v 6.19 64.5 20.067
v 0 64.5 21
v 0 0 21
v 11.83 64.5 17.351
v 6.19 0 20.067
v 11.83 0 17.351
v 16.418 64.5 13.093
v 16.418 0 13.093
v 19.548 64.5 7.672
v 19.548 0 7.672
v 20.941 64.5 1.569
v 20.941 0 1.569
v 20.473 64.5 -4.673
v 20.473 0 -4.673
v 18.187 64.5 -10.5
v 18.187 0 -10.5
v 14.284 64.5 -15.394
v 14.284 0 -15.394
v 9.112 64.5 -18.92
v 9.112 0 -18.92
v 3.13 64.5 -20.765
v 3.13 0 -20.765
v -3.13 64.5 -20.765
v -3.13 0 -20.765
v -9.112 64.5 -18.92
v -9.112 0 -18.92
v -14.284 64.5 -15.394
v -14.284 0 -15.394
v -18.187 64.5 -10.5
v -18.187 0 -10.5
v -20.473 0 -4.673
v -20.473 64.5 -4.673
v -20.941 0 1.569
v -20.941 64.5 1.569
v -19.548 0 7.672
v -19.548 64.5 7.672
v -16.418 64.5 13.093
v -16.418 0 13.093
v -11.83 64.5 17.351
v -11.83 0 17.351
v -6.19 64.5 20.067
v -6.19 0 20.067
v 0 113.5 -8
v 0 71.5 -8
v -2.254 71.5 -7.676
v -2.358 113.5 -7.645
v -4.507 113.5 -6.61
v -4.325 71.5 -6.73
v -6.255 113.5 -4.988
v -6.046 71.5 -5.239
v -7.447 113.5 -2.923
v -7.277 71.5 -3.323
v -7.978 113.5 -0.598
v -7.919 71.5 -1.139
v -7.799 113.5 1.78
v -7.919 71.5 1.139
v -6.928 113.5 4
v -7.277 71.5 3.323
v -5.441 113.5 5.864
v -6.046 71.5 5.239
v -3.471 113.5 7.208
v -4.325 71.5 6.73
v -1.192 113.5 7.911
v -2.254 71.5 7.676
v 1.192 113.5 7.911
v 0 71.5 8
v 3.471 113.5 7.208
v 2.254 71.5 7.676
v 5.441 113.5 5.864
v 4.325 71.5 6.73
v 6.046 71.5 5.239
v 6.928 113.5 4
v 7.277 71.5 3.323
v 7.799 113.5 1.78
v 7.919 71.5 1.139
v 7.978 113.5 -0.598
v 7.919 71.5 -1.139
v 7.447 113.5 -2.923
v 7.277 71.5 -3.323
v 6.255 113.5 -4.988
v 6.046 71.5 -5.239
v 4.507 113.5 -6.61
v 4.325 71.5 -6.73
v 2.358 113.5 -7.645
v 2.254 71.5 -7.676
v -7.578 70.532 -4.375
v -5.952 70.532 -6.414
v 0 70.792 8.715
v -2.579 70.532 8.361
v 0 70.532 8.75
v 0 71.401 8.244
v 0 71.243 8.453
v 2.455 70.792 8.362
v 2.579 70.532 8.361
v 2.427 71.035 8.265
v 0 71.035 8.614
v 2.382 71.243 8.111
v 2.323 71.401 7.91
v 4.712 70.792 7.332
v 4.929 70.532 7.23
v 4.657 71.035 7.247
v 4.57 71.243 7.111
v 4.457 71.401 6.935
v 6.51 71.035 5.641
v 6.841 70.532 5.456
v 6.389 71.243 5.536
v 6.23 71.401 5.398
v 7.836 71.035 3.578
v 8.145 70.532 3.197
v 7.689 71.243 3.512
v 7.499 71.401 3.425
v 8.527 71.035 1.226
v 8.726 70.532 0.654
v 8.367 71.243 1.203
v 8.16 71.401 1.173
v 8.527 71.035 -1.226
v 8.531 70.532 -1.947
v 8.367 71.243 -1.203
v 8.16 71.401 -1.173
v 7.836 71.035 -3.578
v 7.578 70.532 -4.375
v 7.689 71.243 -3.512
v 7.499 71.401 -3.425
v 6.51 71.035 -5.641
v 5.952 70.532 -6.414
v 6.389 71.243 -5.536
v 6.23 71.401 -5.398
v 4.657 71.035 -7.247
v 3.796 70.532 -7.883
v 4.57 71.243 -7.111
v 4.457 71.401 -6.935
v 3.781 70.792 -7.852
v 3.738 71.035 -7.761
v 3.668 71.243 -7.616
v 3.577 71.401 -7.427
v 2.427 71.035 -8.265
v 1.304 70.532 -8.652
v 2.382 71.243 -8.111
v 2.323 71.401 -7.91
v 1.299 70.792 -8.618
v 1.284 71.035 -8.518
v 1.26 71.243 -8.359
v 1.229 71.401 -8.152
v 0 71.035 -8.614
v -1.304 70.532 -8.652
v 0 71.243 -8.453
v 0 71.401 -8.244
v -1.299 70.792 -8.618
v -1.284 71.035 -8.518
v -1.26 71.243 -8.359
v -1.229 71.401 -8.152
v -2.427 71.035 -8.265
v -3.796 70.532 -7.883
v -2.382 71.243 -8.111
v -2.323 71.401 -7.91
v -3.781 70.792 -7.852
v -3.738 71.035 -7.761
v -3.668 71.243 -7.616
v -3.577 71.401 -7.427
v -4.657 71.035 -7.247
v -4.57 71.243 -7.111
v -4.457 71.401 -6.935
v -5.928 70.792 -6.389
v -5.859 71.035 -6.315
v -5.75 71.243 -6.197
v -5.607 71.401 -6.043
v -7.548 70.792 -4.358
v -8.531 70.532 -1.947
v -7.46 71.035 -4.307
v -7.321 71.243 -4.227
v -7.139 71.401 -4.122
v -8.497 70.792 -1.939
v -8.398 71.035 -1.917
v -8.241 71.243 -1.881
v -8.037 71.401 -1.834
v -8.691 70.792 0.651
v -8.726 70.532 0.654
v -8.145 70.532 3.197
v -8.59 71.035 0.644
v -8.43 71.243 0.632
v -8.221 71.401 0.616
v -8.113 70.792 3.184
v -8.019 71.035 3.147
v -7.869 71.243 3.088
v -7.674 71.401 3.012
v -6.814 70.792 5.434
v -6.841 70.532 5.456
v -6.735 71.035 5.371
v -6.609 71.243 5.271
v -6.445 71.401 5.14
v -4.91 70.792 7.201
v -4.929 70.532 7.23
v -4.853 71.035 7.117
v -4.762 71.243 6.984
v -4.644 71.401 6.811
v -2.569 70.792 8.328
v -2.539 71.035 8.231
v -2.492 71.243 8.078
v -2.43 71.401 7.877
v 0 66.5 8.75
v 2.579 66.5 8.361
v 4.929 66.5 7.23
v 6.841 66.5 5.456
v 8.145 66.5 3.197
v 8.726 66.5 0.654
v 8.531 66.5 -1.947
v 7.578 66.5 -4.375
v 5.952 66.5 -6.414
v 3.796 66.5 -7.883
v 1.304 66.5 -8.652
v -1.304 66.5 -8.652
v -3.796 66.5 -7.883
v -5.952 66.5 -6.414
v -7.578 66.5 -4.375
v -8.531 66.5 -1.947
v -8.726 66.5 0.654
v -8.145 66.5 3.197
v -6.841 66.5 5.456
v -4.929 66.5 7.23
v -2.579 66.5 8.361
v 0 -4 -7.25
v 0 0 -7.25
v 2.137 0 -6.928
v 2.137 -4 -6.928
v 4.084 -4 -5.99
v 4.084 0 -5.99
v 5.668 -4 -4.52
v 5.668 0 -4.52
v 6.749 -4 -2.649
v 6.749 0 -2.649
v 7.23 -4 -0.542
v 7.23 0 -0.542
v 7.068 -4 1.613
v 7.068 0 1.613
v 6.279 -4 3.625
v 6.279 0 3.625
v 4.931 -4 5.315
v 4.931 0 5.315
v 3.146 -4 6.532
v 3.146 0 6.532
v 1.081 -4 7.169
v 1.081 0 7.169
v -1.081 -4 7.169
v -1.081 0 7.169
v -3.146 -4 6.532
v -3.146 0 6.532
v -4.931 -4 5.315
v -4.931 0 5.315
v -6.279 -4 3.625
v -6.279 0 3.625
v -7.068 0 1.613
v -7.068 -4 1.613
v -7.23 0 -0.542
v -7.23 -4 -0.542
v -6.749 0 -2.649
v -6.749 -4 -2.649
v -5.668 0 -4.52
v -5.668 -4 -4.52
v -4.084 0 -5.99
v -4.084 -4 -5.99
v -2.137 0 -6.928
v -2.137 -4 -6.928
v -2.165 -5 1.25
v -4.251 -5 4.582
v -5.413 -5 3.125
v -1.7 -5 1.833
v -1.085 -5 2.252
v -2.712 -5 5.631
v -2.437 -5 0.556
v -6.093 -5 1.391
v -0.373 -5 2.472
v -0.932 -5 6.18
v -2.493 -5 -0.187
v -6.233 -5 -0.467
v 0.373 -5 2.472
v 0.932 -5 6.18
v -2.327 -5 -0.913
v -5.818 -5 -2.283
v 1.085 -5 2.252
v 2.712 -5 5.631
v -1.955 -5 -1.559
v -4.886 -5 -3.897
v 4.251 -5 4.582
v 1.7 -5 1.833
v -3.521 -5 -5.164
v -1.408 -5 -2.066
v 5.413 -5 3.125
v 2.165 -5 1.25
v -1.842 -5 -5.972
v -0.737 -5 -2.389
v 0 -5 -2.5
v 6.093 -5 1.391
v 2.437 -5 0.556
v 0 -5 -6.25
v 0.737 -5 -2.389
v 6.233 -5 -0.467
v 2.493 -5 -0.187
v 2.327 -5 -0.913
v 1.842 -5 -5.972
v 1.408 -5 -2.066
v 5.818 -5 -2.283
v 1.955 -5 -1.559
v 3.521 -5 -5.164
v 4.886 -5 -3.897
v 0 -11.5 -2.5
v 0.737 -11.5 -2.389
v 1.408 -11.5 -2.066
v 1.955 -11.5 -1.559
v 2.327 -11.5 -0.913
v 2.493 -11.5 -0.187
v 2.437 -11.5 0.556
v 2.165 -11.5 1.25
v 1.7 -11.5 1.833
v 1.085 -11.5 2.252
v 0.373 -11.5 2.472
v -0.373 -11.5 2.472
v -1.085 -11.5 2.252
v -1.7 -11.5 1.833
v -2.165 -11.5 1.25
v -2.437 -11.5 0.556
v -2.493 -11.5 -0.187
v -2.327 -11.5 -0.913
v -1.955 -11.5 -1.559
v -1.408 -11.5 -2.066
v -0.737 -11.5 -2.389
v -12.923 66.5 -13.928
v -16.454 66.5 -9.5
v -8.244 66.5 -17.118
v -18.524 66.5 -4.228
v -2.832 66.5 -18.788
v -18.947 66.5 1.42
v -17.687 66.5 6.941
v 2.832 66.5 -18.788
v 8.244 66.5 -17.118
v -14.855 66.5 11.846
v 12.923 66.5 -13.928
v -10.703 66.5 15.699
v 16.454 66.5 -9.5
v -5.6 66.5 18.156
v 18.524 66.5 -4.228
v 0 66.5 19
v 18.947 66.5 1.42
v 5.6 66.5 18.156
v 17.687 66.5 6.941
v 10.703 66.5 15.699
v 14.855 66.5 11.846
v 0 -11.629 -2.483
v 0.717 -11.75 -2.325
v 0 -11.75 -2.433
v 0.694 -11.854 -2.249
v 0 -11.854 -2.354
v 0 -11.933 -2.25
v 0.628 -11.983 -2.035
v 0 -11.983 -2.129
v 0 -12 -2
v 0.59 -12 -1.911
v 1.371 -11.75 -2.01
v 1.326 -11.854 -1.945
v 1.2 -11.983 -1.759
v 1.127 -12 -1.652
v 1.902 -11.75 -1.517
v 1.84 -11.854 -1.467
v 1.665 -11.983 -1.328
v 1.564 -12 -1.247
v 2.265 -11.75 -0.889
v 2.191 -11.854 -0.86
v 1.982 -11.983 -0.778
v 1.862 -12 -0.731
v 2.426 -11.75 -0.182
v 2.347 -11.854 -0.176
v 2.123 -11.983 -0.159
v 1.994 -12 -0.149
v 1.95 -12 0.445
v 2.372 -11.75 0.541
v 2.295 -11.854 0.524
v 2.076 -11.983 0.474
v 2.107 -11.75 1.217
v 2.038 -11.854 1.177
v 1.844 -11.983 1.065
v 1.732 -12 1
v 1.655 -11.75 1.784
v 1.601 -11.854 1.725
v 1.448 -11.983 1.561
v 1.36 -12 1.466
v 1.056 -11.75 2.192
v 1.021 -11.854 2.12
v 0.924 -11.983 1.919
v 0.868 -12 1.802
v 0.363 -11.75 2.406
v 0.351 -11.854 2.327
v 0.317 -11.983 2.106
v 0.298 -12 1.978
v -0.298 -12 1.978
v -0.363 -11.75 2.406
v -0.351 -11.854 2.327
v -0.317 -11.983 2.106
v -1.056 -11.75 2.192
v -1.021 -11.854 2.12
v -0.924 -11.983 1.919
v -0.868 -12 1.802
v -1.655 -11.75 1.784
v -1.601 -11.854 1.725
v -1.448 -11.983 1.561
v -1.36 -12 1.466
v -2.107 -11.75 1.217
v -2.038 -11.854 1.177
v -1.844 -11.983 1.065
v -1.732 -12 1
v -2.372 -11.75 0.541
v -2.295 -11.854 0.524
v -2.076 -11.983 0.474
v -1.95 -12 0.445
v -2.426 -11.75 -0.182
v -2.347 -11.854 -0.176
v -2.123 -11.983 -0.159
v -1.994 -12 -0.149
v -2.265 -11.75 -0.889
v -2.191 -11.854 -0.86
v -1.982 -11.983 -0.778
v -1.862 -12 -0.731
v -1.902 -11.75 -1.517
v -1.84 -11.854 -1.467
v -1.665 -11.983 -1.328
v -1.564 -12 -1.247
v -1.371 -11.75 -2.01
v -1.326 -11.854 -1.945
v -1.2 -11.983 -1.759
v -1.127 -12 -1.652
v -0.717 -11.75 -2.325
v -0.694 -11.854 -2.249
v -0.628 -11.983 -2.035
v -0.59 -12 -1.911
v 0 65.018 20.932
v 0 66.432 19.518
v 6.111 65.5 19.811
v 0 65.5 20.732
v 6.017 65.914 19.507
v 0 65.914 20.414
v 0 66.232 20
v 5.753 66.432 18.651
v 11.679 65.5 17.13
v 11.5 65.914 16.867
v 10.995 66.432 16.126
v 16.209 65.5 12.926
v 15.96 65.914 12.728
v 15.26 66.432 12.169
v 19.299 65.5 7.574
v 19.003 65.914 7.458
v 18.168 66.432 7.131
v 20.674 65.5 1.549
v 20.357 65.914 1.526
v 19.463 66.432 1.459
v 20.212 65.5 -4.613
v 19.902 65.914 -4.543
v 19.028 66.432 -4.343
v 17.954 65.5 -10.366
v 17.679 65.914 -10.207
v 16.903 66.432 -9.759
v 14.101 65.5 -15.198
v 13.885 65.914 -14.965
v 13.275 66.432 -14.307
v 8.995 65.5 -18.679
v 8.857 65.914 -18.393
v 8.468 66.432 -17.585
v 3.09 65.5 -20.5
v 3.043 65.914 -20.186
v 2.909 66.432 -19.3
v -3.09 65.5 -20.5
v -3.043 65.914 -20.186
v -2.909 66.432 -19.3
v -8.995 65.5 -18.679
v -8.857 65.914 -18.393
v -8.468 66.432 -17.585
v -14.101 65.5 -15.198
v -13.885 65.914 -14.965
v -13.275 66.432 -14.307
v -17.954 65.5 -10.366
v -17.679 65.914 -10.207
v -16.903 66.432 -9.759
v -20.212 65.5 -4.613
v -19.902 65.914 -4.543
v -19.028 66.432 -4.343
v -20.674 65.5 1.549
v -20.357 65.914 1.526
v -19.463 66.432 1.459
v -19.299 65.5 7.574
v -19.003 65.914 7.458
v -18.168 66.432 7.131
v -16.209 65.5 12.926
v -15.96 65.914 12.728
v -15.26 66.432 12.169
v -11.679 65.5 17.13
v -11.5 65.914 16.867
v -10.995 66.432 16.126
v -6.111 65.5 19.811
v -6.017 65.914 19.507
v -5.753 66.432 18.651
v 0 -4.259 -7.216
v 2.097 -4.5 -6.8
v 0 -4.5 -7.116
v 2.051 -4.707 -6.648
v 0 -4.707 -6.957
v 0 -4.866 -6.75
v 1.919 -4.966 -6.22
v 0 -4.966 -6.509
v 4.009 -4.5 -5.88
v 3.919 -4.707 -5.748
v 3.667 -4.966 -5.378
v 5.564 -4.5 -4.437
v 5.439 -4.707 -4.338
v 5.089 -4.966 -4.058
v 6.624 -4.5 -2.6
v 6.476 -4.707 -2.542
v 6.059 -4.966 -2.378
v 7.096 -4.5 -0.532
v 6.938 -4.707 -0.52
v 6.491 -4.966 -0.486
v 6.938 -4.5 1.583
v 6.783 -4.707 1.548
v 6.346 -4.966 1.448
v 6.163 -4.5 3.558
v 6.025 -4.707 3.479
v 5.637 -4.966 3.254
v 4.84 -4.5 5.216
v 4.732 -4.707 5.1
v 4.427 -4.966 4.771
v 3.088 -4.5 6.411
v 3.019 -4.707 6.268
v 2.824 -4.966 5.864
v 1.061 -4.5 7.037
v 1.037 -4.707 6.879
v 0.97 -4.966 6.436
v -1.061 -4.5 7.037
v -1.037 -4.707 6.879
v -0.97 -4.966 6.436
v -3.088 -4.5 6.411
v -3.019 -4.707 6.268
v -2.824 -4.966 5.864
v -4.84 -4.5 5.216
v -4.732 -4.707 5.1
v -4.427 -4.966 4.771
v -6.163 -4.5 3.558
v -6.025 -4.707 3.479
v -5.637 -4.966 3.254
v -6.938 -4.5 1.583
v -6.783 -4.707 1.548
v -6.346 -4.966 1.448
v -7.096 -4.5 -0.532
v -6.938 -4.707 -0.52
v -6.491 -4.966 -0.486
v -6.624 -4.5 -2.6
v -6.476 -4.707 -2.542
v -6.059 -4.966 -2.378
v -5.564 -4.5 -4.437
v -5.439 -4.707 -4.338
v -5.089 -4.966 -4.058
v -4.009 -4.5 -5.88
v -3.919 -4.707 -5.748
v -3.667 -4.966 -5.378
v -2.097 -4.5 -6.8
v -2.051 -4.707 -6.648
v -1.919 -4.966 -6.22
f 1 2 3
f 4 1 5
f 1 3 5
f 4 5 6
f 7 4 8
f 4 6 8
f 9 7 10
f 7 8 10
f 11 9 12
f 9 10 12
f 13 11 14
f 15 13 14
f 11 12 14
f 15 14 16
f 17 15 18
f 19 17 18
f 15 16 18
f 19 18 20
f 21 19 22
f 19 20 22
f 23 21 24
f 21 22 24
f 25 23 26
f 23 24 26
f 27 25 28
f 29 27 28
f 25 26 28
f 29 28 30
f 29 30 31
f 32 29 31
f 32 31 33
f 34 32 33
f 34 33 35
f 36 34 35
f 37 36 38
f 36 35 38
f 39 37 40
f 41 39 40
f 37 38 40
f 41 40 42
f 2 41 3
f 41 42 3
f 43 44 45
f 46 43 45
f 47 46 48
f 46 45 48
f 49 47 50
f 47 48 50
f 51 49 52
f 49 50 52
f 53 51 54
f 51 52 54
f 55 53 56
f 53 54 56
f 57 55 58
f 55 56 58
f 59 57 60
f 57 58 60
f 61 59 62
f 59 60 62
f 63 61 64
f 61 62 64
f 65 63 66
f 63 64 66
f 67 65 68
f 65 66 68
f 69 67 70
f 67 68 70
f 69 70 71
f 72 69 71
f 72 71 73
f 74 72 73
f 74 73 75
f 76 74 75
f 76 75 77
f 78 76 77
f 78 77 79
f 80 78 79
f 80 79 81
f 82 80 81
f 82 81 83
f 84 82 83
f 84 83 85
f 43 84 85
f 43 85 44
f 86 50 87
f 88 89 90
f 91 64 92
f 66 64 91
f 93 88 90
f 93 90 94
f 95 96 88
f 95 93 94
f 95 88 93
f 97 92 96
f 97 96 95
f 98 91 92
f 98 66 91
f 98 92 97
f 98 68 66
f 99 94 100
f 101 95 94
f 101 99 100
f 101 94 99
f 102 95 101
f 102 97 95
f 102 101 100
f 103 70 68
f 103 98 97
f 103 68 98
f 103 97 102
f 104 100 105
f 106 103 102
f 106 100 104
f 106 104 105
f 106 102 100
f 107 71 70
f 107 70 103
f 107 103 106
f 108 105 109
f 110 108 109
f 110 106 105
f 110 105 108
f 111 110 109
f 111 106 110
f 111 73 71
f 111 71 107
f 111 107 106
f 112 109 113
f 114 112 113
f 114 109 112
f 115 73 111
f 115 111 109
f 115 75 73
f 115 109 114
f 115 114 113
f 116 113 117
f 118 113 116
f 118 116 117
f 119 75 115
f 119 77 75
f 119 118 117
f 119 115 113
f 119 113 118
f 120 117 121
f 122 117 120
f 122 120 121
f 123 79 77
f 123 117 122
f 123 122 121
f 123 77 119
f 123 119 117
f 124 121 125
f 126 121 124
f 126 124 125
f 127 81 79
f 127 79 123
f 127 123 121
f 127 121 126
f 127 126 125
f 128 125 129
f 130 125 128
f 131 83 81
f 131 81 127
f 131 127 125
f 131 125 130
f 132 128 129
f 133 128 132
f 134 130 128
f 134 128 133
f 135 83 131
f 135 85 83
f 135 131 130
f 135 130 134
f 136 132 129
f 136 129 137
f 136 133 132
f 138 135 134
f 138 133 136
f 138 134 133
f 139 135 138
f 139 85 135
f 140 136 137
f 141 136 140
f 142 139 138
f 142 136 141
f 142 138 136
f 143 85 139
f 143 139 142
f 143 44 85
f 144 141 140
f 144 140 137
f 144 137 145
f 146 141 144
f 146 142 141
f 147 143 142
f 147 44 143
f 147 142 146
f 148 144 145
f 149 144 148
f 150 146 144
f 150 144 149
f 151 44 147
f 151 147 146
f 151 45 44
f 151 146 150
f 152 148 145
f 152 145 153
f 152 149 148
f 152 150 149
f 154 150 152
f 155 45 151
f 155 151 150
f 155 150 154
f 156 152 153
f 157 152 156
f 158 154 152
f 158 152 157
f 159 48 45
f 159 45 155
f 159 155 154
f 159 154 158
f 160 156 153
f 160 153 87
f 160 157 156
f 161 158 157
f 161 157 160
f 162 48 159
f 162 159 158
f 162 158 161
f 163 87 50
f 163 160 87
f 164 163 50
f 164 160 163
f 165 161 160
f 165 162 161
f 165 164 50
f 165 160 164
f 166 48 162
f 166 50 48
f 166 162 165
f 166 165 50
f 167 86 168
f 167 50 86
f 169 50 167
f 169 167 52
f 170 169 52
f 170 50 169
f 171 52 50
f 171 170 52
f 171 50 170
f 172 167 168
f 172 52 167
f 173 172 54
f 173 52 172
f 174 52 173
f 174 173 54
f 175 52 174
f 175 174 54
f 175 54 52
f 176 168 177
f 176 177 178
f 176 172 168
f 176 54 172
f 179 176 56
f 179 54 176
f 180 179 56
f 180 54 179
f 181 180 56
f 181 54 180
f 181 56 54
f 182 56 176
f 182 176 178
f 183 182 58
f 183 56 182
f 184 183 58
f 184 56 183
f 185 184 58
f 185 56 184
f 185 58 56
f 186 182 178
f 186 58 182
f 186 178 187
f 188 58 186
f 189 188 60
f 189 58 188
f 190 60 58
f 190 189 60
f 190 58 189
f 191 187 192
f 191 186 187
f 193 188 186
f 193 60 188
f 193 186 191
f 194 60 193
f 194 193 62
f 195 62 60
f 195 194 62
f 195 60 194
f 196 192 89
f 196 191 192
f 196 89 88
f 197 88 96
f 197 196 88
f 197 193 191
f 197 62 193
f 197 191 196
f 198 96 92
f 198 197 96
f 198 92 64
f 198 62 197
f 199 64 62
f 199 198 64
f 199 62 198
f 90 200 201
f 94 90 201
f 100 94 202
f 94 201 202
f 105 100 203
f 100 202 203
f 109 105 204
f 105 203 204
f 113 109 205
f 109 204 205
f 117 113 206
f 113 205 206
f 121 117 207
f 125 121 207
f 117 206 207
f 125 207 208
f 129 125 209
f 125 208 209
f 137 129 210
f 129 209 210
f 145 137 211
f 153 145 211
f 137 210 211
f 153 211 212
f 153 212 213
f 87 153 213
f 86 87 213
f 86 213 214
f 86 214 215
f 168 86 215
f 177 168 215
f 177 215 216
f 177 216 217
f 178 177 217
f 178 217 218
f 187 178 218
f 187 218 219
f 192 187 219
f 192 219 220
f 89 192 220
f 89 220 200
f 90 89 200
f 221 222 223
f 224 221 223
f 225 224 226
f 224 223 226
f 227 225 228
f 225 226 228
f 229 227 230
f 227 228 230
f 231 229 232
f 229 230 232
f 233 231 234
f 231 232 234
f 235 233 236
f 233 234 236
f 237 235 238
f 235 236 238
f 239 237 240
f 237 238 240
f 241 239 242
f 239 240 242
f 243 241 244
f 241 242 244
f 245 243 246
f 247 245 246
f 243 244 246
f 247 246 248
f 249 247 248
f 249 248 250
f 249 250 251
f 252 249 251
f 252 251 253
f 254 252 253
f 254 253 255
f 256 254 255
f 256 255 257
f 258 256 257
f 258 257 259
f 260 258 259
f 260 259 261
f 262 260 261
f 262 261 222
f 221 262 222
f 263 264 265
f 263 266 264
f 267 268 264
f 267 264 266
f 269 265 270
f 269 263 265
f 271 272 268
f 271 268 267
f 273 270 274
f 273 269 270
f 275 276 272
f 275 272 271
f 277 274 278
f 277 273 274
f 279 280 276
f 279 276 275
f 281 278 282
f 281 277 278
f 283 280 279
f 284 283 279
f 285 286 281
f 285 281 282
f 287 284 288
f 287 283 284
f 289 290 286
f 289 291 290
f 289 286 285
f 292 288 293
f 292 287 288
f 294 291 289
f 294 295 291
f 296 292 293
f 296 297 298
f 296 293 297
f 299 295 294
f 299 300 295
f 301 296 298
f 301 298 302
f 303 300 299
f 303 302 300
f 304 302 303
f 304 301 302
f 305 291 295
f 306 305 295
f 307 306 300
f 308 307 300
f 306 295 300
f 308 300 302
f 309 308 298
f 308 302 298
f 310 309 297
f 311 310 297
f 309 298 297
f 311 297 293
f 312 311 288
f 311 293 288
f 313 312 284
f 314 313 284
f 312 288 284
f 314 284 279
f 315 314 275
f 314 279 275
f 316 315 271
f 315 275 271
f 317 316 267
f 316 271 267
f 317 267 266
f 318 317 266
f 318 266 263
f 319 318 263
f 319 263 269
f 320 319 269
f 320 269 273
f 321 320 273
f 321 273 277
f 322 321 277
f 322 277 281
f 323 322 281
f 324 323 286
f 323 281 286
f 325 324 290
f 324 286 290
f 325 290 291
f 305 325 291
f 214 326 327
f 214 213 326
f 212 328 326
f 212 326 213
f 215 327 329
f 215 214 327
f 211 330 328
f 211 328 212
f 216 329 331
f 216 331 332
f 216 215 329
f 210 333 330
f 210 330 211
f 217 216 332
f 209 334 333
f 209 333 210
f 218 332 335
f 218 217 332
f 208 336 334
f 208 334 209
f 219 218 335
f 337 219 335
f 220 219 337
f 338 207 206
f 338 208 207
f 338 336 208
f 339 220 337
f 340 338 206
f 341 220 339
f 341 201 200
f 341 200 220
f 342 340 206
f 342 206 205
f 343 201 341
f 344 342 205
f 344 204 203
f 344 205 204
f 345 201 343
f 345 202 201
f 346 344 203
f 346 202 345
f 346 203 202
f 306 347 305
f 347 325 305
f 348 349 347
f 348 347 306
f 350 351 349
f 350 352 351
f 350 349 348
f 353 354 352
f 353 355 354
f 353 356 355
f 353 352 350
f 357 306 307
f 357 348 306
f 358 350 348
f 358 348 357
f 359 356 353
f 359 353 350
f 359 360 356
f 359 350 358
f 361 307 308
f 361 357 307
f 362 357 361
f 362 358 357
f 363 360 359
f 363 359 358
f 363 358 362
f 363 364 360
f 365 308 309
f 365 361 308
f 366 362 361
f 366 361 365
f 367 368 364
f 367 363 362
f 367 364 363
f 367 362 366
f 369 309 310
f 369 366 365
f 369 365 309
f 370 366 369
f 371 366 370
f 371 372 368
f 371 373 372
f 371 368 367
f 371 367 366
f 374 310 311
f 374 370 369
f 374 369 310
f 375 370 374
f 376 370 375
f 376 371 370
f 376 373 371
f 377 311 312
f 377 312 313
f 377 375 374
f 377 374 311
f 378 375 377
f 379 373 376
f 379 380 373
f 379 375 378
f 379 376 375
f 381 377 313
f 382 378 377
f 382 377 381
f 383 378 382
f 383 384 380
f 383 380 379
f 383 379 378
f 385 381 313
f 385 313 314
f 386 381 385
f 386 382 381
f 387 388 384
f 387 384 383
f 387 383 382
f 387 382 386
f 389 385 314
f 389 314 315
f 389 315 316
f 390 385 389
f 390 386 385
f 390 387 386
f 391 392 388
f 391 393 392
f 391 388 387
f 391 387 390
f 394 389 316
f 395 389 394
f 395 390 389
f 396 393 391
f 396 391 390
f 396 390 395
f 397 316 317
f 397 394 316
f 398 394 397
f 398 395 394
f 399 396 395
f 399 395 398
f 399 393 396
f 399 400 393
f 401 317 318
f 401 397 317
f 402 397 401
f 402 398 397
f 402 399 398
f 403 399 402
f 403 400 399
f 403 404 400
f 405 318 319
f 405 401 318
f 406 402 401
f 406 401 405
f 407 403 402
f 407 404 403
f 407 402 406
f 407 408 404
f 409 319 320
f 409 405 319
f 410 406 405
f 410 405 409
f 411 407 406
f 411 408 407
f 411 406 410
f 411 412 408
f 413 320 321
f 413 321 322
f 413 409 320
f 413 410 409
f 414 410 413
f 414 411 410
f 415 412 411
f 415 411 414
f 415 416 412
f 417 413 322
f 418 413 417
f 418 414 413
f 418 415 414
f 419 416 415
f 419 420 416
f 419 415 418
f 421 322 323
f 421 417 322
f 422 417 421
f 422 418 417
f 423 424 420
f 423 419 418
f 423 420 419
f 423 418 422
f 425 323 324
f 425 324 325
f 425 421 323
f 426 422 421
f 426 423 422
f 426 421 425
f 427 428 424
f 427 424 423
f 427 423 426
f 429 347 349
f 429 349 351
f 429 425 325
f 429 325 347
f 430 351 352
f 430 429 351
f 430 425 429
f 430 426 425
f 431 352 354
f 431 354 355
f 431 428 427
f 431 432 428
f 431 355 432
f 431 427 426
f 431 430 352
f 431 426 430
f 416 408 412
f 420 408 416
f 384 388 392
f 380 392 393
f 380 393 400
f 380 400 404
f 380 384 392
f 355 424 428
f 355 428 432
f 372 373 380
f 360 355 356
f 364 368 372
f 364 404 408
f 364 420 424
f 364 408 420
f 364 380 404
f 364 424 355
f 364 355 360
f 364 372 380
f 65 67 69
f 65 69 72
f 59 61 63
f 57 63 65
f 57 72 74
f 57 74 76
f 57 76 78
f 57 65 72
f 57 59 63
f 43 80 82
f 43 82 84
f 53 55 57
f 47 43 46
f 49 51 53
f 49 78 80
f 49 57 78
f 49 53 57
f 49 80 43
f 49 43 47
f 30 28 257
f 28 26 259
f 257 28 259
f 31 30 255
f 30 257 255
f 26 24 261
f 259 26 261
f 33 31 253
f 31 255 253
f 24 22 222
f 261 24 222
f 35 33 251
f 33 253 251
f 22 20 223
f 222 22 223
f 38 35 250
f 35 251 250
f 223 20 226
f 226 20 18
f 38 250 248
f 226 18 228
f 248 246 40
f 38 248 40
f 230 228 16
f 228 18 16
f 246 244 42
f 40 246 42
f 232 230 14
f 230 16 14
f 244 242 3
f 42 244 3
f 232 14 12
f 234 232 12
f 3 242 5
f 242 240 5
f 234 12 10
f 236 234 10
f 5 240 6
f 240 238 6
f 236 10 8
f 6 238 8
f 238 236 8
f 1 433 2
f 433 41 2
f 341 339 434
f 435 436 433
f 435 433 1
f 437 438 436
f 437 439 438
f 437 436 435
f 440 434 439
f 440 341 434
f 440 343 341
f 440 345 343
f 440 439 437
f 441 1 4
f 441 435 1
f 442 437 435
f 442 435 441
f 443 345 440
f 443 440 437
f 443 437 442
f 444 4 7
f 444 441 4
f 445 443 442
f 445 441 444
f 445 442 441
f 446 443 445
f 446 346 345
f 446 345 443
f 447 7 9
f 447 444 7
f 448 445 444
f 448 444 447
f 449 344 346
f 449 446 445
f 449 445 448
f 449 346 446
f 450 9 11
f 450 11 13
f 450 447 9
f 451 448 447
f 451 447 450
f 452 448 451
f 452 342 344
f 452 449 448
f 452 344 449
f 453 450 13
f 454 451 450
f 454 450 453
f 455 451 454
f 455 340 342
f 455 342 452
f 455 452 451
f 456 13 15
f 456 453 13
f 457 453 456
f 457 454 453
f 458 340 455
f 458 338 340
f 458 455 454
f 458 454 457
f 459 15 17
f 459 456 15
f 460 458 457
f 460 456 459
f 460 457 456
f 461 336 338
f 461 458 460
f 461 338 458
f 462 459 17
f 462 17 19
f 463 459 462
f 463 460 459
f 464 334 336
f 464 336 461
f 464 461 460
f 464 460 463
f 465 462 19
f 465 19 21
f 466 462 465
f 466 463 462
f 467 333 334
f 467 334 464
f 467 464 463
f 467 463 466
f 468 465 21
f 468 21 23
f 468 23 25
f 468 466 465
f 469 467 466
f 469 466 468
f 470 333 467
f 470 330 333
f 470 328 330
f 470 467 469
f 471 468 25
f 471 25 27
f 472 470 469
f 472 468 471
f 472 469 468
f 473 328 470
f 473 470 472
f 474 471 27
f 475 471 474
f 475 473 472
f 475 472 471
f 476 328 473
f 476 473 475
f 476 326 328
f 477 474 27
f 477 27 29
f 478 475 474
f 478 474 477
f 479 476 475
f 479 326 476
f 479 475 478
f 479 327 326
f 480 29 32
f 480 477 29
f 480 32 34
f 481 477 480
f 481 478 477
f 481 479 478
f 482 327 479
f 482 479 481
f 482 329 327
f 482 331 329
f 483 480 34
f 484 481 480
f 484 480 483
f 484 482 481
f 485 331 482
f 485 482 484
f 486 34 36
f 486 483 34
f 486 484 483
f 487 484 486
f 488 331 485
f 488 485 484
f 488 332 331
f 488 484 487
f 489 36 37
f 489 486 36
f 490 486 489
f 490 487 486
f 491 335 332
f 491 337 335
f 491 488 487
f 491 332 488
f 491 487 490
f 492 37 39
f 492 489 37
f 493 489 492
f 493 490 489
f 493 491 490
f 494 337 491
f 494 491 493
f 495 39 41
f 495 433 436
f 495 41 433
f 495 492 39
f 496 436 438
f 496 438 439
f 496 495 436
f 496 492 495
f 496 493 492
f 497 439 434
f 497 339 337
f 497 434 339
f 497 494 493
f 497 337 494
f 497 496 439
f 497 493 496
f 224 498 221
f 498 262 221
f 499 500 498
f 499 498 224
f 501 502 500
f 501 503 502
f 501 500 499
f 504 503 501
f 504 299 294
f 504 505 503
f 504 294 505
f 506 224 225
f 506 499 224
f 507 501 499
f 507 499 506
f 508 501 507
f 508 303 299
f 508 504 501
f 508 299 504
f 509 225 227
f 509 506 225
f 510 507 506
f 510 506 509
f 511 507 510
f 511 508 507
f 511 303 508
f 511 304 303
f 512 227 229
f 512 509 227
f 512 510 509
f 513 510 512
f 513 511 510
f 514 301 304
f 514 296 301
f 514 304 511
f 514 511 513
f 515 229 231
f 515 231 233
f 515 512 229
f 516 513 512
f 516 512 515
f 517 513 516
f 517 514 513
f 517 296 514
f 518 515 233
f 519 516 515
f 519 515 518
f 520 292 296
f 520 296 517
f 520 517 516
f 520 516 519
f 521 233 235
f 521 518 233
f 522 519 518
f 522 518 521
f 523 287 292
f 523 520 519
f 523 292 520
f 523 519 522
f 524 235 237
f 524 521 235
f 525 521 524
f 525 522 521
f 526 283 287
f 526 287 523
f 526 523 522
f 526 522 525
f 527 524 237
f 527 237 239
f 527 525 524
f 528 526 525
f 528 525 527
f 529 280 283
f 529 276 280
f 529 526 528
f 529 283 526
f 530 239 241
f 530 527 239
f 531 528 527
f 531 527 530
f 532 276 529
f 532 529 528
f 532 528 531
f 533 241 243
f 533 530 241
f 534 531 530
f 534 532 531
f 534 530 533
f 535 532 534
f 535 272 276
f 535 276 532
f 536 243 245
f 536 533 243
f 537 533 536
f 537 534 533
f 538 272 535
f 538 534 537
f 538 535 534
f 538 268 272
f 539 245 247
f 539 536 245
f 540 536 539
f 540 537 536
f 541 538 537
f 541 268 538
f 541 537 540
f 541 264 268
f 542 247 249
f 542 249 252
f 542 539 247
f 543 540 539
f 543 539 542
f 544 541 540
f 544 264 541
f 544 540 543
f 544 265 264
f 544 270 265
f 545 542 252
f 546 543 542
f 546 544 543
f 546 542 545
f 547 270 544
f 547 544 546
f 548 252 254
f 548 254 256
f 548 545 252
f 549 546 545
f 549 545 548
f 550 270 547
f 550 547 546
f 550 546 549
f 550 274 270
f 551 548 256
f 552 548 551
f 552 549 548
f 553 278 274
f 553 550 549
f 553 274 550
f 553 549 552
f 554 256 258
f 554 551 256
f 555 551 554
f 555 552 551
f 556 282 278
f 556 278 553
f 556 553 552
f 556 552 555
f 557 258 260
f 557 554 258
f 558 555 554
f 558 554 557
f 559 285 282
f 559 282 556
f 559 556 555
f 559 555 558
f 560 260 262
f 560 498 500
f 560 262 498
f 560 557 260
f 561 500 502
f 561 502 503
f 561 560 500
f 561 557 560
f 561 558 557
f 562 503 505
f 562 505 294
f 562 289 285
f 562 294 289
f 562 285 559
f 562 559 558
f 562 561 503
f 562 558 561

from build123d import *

# Parameters (mm, degrees)
SKETCH1_R           = 21
BOSS_EXTRUDE1_DEPTH = 66.5
SKETCH3_R           = 8.75
BOSS_EXTRUDE2_DEPTH = 5
FILLET1_R           = 2
SKETCH4_R           = 8
BOSS_EXTRUDE3_DEPTH = 42
SKETCH5_R           = 7.25
BOSS_EXTRUDE4_DEPTH = 5
FILLET2_R           = 1
SKETCH6_R           = 2.5
BOSS_EXTRUDE5_DEPTH = 7
FILLET3_R           = 0.5


with BuildPart() as part:
    # Sketch1 → Boss-Extrude1 (new body)
    with BuildSketch(Plane(origin=(0, 0, 0), x_dir=(1, 0, 0), z_dir=(0, 1, 0))):
        with Locations(Location((0, 0, 0), (0, 0, 270))):
            Circle(SKETCH1_R)
    extrude(amount=BOSS_EXTRUDE1_DEPTH)

    # Sketch3 → Boss-Extrude2 (add)
    with BuildSketch(Plane(origin=(0, 66.5, 0), x_dir=(1, 0, 0), z_dir=(0, 1, 0))):
        with Locations(Location((0, 0, 0), (0, 0, 270))):
            Circle(SKETCH3_R)
    extrude(amount=BOSS_EXTRUDE2_DEPTH)

    # Fillet1
    fillet1_edges = [part.edges().sort_by_distance(p)[0] for p in [
        (0, 66.5, -21),
    ]]
    fillet(fillet1_edges, radius=FILLET1_R)

    # Sketch4 → Boss-Extrude3 (add)
    with BuildSketch(Plane(origin=(0, 71.5, 0), x_dir=(1, 0, 0), z_dir=(0, 1, 0))):
        with Locations(Location((0, 0, 0), (0, 0, 90))):
            Circle(SKETCH4_R)
    extrude(amount=BOSS_EXTRUDE3_DEPTH)

    # Sketch5 → Boss-Extrude4 (add)
    with BuildSketch(Plane.XZ):
        with Locations(Location((0, 0, 0), (0, 0, 270))):
            Circle(SKETCH5_R)
    extrude(amount=BOSS_EXTRUDE4_DEPTH)

    # Fillet2
    # the kernel refuses this fillet: 1 mm, written as the material it takes off along each edge
    with BuildSketch(Plane(origin=(0, -5, 0), x_dir=(0, 0, -1), z_dir=(-1, 0, 0))) as fillet2_piece_1:
        with BuildLine():
            CenterArc((7.25 - FILLET2_R, -FILLET2_R), FILLET2_R, 0, 90)
            Line((7.25 - FILLET2_R, 0), (7.25 - FILLET2_R, FILLET2_R * 0.02))
            Line((7.25 - FILLET2_R, FILLET2_R * 0.02), (7.25 + FILLET2_R * 0.02, FILLET2_R * 0.02))
            Line((7.25 + FILLET2_R * 0.02, FILLET2_R * 0.02), (7.25 + FILLET2_R * 0.02, -FILLET2_R))
            Line((7.25 + FILLET2_R * 0.02, -FILLET2_R), (7.25, -FILLET2_R))
        make_face()
    revolve(axis=Axis((0, -5, 0), (0, -1, 0)), mode=Mode.SUBTRACT)
    with BuildSketch(Plane(origin=(0, 71.5, 0), x_dir=(0, 0, 1), z_dir=(-1, 0, 0))) as fillet2_piece_2:
        with BuildLine():
            CenterArc((7.75, -0.968245837), FILLET2_R, 0, 75.522487814)
            Line((8, 0), (8.005, 0.019364917))
            ThreePointArc((8.005, 0.019364917), (8.375, 0.02), (8.75, 0.02))
            Line((8.75, 0.02), (8.77, 0))
            Line((8.77, 0), (8.77, -0.968245837))
            Line((8.77, -0.968245837), (8.75, -0.968245837))
        make_face()
    revolve(axis=Axis((0, 71.5, 0), (0, 1, 0)), mode=Mode.SUBTRACT)

    # Sketch6 → Boss-Extrude5 (add)
    with BuildSketch(Plane.XZ.offset(5)):
        with Locations(Location((0, 0, 0), (0, 0, 270))):
            Circle(SKETCH6_R)
    extrude(amount=BOSS_EXTRUDE5_DEPTH)

    # Fillet3
    fillet3_edges = [part.edges().sort_by_distance(p)[0] for p in [
        (0, -12, 2.5),
    ]]
    fillet(fillet3_edges, radius=FILLET3_R)


solid = part.part
